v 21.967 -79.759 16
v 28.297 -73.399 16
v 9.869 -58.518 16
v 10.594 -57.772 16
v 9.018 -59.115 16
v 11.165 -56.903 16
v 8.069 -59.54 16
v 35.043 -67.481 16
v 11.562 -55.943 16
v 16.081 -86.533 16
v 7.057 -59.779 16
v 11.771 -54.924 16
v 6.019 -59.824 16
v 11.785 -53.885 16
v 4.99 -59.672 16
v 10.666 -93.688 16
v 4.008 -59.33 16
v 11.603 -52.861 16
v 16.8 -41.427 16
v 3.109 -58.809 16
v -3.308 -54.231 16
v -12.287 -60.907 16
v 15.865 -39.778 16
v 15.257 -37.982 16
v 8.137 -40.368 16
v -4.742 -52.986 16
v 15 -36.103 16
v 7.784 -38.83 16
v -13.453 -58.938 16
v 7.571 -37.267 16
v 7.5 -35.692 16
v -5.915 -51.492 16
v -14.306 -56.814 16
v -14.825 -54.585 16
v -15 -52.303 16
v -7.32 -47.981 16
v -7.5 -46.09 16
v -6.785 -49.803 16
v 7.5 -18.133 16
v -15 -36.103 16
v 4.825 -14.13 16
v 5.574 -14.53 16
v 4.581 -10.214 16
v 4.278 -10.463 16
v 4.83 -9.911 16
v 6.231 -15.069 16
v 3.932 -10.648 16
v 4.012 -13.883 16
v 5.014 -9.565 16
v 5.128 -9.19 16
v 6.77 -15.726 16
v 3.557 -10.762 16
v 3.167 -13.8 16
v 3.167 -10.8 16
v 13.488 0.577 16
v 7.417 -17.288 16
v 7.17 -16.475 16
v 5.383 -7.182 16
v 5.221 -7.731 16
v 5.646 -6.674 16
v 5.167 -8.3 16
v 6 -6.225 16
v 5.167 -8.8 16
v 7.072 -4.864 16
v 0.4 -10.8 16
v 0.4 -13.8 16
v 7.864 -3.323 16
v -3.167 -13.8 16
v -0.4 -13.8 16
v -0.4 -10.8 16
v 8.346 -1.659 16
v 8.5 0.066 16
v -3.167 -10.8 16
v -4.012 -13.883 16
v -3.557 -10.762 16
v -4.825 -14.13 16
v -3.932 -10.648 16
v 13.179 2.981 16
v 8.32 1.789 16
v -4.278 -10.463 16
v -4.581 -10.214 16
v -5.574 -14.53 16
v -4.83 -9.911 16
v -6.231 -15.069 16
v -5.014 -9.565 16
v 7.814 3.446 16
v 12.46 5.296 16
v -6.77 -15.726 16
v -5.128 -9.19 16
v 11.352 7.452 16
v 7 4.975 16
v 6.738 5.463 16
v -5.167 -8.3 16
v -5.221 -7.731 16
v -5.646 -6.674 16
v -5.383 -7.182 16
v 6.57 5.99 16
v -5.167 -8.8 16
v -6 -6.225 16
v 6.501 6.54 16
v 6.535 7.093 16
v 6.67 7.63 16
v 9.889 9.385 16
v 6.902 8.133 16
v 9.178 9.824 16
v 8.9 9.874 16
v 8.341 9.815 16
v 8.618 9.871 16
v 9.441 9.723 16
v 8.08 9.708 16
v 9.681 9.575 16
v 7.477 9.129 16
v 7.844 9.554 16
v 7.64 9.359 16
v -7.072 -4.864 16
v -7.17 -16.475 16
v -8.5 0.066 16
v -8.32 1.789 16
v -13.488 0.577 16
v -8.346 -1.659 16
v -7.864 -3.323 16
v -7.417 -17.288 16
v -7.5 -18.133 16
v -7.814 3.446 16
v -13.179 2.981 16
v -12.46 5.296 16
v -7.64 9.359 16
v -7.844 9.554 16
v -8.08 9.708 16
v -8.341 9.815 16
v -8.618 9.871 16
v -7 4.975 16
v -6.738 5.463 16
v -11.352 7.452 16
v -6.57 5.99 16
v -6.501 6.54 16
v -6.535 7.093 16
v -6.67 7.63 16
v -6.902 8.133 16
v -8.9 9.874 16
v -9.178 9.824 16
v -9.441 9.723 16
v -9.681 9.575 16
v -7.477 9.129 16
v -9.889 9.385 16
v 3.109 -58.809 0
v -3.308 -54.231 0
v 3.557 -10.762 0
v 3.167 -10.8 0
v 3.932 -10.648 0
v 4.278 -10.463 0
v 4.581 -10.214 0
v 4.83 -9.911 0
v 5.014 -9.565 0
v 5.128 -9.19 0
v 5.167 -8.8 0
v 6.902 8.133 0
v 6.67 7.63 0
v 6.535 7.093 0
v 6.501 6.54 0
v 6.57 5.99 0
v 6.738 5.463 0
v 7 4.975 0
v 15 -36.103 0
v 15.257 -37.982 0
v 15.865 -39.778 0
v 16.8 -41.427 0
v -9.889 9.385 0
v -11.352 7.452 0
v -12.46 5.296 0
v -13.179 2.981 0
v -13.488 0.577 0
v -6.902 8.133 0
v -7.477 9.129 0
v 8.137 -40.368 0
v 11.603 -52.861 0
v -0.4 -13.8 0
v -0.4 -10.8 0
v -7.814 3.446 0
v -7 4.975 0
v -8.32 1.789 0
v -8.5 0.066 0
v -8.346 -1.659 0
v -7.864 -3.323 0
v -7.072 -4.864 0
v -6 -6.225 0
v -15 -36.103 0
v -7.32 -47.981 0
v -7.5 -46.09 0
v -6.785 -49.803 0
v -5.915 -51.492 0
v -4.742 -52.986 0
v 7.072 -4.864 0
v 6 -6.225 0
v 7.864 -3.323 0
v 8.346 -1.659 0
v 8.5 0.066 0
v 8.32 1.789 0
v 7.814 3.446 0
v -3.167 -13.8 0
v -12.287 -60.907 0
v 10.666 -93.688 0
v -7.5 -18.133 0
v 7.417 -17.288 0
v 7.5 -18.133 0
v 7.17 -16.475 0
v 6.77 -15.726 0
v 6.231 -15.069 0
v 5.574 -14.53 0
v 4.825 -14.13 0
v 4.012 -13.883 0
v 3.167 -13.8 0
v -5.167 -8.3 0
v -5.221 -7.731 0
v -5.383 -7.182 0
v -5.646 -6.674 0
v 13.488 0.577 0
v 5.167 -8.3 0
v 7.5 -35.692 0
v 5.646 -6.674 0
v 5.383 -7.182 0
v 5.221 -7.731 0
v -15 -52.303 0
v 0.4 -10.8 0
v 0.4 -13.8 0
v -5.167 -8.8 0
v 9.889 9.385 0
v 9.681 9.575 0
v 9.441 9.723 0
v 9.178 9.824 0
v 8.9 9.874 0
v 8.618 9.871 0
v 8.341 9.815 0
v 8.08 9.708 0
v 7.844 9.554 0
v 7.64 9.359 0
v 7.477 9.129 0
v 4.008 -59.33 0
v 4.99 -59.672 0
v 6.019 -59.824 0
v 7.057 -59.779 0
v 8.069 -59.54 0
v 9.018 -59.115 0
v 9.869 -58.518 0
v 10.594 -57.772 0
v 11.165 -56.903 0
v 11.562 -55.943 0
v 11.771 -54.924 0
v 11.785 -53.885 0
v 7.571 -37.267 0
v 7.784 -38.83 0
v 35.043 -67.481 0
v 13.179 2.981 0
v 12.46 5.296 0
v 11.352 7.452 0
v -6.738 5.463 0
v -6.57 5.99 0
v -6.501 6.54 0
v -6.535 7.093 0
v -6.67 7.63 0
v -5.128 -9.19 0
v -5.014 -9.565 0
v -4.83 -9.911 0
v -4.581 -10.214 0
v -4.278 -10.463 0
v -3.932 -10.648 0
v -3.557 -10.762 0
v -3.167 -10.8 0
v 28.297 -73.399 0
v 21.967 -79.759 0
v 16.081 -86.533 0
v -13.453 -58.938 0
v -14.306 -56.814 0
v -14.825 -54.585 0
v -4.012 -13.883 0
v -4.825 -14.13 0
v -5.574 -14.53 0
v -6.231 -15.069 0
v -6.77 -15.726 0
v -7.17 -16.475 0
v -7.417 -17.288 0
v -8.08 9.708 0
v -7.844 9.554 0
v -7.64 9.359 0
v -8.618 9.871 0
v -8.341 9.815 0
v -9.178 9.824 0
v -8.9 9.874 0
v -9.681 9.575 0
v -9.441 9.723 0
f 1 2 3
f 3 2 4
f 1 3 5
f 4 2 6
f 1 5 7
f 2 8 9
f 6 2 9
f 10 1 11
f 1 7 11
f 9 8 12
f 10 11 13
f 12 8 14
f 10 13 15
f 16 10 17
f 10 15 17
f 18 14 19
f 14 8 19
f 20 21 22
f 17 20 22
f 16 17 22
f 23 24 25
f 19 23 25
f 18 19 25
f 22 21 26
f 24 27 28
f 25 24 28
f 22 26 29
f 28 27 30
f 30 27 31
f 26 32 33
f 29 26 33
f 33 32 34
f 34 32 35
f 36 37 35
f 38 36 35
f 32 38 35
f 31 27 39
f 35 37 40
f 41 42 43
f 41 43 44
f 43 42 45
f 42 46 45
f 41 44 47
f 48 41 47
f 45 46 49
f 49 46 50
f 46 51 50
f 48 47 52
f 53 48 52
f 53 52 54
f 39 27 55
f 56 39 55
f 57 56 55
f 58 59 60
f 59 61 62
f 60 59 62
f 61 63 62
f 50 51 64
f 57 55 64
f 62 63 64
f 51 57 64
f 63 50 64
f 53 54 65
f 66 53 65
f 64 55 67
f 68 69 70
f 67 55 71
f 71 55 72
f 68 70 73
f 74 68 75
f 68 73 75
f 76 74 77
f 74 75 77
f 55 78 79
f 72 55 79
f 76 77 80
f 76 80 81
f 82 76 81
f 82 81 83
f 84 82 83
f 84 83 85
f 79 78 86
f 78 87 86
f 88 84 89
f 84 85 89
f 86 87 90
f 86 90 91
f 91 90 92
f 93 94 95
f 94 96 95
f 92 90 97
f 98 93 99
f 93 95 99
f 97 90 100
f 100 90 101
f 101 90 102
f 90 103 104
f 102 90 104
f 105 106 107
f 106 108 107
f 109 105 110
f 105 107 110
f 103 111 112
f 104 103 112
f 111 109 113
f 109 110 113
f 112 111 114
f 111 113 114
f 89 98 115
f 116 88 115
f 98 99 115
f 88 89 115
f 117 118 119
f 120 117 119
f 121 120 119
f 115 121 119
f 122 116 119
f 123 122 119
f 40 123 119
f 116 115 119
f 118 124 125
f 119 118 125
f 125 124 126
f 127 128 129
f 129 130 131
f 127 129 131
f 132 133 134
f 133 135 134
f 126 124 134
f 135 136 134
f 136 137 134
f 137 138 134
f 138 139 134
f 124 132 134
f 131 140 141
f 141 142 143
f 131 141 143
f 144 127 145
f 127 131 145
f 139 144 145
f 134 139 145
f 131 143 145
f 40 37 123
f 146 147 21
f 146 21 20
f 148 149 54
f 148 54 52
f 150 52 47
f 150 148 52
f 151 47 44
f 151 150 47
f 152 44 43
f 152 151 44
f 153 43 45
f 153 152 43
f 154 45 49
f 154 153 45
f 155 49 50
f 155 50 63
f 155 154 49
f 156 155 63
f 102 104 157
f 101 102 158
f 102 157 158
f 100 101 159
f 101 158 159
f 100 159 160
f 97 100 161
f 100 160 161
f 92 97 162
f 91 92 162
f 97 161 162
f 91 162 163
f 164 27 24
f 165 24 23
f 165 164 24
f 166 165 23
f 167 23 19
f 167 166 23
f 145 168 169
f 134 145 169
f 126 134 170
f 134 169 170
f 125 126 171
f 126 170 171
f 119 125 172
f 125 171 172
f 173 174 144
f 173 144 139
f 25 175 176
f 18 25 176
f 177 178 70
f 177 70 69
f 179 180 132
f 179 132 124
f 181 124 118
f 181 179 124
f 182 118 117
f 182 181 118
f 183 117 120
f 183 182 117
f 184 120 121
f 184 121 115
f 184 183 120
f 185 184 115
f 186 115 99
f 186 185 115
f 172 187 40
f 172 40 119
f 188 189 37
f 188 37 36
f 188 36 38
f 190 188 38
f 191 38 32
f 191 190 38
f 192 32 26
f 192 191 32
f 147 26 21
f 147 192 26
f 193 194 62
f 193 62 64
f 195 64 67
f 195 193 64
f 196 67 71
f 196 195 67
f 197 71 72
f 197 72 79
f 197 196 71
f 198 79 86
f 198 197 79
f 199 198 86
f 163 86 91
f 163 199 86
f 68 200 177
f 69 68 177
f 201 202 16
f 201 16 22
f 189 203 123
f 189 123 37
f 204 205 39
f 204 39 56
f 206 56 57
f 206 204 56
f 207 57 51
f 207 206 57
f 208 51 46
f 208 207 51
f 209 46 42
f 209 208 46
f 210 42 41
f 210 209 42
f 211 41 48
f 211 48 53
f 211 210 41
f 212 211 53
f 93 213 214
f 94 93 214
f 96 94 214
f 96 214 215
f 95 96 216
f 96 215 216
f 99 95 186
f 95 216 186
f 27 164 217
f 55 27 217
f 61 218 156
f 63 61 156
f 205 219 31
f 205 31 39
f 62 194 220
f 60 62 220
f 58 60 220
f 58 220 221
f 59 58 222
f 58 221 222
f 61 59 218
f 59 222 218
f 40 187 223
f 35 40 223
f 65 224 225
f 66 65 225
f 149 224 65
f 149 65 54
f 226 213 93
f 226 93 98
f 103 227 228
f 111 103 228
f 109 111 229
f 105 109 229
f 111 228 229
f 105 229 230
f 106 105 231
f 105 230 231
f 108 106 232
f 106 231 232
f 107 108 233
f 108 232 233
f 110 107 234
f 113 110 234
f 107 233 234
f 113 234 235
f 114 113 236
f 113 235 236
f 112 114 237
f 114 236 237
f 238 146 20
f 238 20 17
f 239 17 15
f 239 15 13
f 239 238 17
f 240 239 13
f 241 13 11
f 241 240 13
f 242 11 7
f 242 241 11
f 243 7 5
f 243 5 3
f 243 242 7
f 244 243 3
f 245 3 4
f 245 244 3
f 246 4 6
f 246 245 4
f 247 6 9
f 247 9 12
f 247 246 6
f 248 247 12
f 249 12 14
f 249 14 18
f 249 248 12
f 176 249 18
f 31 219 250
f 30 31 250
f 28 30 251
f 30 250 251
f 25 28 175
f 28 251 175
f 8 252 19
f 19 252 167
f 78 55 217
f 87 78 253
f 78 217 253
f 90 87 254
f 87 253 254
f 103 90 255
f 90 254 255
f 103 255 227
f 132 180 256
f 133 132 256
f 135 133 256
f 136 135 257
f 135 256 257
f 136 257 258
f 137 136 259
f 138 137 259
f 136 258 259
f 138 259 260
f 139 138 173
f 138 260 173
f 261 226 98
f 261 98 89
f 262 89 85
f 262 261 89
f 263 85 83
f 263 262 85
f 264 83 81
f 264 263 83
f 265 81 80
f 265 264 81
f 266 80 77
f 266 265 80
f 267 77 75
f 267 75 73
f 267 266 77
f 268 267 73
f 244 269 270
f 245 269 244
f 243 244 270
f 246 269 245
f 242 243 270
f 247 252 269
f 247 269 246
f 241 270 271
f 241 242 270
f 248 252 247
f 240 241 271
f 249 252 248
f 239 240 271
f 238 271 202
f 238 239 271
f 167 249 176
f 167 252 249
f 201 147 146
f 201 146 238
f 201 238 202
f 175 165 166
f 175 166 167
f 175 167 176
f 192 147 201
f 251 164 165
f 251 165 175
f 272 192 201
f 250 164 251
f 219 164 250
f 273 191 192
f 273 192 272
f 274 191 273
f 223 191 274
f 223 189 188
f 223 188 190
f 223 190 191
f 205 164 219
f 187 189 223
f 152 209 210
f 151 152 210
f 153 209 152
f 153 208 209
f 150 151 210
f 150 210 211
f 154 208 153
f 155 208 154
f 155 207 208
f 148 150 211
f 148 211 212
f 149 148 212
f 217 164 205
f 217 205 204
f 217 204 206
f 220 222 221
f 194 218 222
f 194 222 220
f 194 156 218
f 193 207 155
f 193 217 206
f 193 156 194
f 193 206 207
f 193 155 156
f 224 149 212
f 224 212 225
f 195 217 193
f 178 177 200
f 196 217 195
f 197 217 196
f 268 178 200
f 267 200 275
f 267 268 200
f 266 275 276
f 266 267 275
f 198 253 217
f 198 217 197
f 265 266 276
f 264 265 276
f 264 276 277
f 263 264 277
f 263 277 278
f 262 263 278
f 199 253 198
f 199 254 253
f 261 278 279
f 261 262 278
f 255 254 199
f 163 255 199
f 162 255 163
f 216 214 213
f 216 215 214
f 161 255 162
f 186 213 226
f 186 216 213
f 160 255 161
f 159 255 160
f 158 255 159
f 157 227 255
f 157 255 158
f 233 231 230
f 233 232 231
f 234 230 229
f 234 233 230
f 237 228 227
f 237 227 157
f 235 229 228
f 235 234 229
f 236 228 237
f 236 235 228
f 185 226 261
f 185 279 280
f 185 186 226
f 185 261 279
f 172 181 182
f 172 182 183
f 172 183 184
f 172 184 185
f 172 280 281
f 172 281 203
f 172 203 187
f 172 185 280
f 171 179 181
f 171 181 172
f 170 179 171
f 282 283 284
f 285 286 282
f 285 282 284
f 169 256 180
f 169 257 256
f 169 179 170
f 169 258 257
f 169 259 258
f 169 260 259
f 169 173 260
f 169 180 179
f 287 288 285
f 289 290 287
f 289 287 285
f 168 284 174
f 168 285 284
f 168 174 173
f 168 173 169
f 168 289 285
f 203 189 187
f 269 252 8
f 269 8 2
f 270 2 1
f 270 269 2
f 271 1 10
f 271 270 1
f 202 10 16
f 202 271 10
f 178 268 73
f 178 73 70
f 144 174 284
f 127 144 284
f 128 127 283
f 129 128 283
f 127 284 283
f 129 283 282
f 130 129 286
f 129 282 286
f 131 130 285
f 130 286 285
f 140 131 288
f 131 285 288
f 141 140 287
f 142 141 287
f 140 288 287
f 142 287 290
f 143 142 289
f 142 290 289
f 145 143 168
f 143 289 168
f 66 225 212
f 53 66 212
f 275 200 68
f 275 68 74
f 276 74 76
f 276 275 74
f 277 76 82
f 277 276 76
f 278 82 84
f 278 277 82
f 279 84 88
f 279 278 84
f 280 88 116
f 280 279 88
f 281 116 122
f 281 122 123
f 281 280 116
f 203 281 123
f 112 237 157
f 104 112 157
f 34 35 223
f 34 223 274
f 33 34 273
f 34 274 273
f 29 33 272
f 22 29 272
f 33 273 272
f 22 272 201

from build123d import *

# Parameters (mm, degrees)
PAD_DEPTH = 16


with BuildPart() as part:
    # Sketch008 → Pad (new body)
    with BuildSketch(Plane.XY):
        with BuildLine():
            Line((-15, -36.103415), (-13.488123, 0.576563))
            ThreePointArc((-9.888981, 9.384513), (-12.459776, 5.295679), (-13.488123, 0.576563))
            ThreePointArc((-7.476837, 9.129029), (-8.617886, 9.870686), (-9.888981, 9.384513))
            Line((-7.476837, 9.129029), (-6.901924, 8.13325))
            ThreePointArc((-7, 4.974937), (-6.501445, 6.540134), (-6.901924, 8.13325))
            ThreePointArc((-7, 4.974937), (-8.464339, -0.800395), (-6, -6.22495))
            ThreePointArc((-5.166667, -8.299933), (-5.382784, -7.181899), (-6, -6.22495))
            Line((-5.166667, -8.299933), (-5.166667, -8.799933))
            ThreePointArc((-5.166667, -8.799933), (-4.58088, -10.214147), (-3.166667, -10.799933))
            Line((-3.166667, -10.799933), (-0.4, -10.799933))
            Line((-0.4, -10.799933), (-0.4, -13.799933))
            Line((-3.166667, -13.799933), (-0.4, -13.799933))
            ThreePointArc((-3.166667, -13.799933), (-6.230796, -15.069137), (-7.5, -18.133266))
            Line((-7.5, -18.133266), (-7.5, -46.090027))
            ThreePointArc((-7.5, -46.090027), (-6.390434, -50.668257), (-3.307962, -54.230517))
            Line((-3.307962, -54.230517), (3.108659, -58.808557))
            ThreePointArc((3.108659, -58.808557), (9.457708, -58.836624), (11.602837, -52.860869))
            Line((8.136694, -40.367919), (11.602837, -52.860869))
            ThreePointArc((7.5, -35.691584), (7.659904, -38.051324), (8.136694, -40.367919))
            Line((7.5, -35.691584), (7.5, -18.133266))
            ThreePointArc((7.5, -18.133266), (6.230796, -15.069137), (3.166667, -13.799933))
            Line((0.4, -13.799933), (3.166667, -13.799933))
            Line((0.4, -10.799933), (0.4, -13.799933))
            Line((0.4, -10.799933), (3.166667, -10.799933))
            ThreePointArc((3.166667, -10.799933), (4.58088, -10.214147), (5.166667, -8.799933))
            Line((5.166667, -8.299933), (5.166667, -8.799933))
            ThreePointArc((6, -6.22495), (5.382784, -7.181899), (5.166667, -8.299933))
            ThreePointArc((6, -6.22495), (8.464339, -0.800395), (7, 4.974937))
            ThreePointArc((6.901924, 8.13325), (6.501445, 6.540134), (7, 4.974937))
            Line((7.476837, 9.129029), (6.901924, 8.13325))
            ThreePointArc((9.888981, 9.384513), (8.617886, 9.870686), (7.476837, 9.129029))
            ThreePointArc((13.488123, 0.576563), (12.459776, 5.295679), (9.888981, 9.384513))
            Line((15, -36.103415), (13.488123, 0.576563))
            ThreePointArc((15, -36.103415), (15.518303, -38.894431), (16.799996, -41.427348))
            Line((35.043138, -67.481255), (16.799996, -41.427348))
            ThreePointArc((35.043138, -67.481255), (21.967147, -79.759147), (10.666391, -93.688291))
            Line((10.666391, -93.688291), (-12.287281, -60.90705))
            ThreePointArc((-15, -52.303404), (-14.305754, -56.813991), (-12.287281, -60.90705))
            Line((-15, -36.103415), (-15, -52.303404))
        make_face()
    extrude(amount=PAD_DEPTH)


solid = part.part
